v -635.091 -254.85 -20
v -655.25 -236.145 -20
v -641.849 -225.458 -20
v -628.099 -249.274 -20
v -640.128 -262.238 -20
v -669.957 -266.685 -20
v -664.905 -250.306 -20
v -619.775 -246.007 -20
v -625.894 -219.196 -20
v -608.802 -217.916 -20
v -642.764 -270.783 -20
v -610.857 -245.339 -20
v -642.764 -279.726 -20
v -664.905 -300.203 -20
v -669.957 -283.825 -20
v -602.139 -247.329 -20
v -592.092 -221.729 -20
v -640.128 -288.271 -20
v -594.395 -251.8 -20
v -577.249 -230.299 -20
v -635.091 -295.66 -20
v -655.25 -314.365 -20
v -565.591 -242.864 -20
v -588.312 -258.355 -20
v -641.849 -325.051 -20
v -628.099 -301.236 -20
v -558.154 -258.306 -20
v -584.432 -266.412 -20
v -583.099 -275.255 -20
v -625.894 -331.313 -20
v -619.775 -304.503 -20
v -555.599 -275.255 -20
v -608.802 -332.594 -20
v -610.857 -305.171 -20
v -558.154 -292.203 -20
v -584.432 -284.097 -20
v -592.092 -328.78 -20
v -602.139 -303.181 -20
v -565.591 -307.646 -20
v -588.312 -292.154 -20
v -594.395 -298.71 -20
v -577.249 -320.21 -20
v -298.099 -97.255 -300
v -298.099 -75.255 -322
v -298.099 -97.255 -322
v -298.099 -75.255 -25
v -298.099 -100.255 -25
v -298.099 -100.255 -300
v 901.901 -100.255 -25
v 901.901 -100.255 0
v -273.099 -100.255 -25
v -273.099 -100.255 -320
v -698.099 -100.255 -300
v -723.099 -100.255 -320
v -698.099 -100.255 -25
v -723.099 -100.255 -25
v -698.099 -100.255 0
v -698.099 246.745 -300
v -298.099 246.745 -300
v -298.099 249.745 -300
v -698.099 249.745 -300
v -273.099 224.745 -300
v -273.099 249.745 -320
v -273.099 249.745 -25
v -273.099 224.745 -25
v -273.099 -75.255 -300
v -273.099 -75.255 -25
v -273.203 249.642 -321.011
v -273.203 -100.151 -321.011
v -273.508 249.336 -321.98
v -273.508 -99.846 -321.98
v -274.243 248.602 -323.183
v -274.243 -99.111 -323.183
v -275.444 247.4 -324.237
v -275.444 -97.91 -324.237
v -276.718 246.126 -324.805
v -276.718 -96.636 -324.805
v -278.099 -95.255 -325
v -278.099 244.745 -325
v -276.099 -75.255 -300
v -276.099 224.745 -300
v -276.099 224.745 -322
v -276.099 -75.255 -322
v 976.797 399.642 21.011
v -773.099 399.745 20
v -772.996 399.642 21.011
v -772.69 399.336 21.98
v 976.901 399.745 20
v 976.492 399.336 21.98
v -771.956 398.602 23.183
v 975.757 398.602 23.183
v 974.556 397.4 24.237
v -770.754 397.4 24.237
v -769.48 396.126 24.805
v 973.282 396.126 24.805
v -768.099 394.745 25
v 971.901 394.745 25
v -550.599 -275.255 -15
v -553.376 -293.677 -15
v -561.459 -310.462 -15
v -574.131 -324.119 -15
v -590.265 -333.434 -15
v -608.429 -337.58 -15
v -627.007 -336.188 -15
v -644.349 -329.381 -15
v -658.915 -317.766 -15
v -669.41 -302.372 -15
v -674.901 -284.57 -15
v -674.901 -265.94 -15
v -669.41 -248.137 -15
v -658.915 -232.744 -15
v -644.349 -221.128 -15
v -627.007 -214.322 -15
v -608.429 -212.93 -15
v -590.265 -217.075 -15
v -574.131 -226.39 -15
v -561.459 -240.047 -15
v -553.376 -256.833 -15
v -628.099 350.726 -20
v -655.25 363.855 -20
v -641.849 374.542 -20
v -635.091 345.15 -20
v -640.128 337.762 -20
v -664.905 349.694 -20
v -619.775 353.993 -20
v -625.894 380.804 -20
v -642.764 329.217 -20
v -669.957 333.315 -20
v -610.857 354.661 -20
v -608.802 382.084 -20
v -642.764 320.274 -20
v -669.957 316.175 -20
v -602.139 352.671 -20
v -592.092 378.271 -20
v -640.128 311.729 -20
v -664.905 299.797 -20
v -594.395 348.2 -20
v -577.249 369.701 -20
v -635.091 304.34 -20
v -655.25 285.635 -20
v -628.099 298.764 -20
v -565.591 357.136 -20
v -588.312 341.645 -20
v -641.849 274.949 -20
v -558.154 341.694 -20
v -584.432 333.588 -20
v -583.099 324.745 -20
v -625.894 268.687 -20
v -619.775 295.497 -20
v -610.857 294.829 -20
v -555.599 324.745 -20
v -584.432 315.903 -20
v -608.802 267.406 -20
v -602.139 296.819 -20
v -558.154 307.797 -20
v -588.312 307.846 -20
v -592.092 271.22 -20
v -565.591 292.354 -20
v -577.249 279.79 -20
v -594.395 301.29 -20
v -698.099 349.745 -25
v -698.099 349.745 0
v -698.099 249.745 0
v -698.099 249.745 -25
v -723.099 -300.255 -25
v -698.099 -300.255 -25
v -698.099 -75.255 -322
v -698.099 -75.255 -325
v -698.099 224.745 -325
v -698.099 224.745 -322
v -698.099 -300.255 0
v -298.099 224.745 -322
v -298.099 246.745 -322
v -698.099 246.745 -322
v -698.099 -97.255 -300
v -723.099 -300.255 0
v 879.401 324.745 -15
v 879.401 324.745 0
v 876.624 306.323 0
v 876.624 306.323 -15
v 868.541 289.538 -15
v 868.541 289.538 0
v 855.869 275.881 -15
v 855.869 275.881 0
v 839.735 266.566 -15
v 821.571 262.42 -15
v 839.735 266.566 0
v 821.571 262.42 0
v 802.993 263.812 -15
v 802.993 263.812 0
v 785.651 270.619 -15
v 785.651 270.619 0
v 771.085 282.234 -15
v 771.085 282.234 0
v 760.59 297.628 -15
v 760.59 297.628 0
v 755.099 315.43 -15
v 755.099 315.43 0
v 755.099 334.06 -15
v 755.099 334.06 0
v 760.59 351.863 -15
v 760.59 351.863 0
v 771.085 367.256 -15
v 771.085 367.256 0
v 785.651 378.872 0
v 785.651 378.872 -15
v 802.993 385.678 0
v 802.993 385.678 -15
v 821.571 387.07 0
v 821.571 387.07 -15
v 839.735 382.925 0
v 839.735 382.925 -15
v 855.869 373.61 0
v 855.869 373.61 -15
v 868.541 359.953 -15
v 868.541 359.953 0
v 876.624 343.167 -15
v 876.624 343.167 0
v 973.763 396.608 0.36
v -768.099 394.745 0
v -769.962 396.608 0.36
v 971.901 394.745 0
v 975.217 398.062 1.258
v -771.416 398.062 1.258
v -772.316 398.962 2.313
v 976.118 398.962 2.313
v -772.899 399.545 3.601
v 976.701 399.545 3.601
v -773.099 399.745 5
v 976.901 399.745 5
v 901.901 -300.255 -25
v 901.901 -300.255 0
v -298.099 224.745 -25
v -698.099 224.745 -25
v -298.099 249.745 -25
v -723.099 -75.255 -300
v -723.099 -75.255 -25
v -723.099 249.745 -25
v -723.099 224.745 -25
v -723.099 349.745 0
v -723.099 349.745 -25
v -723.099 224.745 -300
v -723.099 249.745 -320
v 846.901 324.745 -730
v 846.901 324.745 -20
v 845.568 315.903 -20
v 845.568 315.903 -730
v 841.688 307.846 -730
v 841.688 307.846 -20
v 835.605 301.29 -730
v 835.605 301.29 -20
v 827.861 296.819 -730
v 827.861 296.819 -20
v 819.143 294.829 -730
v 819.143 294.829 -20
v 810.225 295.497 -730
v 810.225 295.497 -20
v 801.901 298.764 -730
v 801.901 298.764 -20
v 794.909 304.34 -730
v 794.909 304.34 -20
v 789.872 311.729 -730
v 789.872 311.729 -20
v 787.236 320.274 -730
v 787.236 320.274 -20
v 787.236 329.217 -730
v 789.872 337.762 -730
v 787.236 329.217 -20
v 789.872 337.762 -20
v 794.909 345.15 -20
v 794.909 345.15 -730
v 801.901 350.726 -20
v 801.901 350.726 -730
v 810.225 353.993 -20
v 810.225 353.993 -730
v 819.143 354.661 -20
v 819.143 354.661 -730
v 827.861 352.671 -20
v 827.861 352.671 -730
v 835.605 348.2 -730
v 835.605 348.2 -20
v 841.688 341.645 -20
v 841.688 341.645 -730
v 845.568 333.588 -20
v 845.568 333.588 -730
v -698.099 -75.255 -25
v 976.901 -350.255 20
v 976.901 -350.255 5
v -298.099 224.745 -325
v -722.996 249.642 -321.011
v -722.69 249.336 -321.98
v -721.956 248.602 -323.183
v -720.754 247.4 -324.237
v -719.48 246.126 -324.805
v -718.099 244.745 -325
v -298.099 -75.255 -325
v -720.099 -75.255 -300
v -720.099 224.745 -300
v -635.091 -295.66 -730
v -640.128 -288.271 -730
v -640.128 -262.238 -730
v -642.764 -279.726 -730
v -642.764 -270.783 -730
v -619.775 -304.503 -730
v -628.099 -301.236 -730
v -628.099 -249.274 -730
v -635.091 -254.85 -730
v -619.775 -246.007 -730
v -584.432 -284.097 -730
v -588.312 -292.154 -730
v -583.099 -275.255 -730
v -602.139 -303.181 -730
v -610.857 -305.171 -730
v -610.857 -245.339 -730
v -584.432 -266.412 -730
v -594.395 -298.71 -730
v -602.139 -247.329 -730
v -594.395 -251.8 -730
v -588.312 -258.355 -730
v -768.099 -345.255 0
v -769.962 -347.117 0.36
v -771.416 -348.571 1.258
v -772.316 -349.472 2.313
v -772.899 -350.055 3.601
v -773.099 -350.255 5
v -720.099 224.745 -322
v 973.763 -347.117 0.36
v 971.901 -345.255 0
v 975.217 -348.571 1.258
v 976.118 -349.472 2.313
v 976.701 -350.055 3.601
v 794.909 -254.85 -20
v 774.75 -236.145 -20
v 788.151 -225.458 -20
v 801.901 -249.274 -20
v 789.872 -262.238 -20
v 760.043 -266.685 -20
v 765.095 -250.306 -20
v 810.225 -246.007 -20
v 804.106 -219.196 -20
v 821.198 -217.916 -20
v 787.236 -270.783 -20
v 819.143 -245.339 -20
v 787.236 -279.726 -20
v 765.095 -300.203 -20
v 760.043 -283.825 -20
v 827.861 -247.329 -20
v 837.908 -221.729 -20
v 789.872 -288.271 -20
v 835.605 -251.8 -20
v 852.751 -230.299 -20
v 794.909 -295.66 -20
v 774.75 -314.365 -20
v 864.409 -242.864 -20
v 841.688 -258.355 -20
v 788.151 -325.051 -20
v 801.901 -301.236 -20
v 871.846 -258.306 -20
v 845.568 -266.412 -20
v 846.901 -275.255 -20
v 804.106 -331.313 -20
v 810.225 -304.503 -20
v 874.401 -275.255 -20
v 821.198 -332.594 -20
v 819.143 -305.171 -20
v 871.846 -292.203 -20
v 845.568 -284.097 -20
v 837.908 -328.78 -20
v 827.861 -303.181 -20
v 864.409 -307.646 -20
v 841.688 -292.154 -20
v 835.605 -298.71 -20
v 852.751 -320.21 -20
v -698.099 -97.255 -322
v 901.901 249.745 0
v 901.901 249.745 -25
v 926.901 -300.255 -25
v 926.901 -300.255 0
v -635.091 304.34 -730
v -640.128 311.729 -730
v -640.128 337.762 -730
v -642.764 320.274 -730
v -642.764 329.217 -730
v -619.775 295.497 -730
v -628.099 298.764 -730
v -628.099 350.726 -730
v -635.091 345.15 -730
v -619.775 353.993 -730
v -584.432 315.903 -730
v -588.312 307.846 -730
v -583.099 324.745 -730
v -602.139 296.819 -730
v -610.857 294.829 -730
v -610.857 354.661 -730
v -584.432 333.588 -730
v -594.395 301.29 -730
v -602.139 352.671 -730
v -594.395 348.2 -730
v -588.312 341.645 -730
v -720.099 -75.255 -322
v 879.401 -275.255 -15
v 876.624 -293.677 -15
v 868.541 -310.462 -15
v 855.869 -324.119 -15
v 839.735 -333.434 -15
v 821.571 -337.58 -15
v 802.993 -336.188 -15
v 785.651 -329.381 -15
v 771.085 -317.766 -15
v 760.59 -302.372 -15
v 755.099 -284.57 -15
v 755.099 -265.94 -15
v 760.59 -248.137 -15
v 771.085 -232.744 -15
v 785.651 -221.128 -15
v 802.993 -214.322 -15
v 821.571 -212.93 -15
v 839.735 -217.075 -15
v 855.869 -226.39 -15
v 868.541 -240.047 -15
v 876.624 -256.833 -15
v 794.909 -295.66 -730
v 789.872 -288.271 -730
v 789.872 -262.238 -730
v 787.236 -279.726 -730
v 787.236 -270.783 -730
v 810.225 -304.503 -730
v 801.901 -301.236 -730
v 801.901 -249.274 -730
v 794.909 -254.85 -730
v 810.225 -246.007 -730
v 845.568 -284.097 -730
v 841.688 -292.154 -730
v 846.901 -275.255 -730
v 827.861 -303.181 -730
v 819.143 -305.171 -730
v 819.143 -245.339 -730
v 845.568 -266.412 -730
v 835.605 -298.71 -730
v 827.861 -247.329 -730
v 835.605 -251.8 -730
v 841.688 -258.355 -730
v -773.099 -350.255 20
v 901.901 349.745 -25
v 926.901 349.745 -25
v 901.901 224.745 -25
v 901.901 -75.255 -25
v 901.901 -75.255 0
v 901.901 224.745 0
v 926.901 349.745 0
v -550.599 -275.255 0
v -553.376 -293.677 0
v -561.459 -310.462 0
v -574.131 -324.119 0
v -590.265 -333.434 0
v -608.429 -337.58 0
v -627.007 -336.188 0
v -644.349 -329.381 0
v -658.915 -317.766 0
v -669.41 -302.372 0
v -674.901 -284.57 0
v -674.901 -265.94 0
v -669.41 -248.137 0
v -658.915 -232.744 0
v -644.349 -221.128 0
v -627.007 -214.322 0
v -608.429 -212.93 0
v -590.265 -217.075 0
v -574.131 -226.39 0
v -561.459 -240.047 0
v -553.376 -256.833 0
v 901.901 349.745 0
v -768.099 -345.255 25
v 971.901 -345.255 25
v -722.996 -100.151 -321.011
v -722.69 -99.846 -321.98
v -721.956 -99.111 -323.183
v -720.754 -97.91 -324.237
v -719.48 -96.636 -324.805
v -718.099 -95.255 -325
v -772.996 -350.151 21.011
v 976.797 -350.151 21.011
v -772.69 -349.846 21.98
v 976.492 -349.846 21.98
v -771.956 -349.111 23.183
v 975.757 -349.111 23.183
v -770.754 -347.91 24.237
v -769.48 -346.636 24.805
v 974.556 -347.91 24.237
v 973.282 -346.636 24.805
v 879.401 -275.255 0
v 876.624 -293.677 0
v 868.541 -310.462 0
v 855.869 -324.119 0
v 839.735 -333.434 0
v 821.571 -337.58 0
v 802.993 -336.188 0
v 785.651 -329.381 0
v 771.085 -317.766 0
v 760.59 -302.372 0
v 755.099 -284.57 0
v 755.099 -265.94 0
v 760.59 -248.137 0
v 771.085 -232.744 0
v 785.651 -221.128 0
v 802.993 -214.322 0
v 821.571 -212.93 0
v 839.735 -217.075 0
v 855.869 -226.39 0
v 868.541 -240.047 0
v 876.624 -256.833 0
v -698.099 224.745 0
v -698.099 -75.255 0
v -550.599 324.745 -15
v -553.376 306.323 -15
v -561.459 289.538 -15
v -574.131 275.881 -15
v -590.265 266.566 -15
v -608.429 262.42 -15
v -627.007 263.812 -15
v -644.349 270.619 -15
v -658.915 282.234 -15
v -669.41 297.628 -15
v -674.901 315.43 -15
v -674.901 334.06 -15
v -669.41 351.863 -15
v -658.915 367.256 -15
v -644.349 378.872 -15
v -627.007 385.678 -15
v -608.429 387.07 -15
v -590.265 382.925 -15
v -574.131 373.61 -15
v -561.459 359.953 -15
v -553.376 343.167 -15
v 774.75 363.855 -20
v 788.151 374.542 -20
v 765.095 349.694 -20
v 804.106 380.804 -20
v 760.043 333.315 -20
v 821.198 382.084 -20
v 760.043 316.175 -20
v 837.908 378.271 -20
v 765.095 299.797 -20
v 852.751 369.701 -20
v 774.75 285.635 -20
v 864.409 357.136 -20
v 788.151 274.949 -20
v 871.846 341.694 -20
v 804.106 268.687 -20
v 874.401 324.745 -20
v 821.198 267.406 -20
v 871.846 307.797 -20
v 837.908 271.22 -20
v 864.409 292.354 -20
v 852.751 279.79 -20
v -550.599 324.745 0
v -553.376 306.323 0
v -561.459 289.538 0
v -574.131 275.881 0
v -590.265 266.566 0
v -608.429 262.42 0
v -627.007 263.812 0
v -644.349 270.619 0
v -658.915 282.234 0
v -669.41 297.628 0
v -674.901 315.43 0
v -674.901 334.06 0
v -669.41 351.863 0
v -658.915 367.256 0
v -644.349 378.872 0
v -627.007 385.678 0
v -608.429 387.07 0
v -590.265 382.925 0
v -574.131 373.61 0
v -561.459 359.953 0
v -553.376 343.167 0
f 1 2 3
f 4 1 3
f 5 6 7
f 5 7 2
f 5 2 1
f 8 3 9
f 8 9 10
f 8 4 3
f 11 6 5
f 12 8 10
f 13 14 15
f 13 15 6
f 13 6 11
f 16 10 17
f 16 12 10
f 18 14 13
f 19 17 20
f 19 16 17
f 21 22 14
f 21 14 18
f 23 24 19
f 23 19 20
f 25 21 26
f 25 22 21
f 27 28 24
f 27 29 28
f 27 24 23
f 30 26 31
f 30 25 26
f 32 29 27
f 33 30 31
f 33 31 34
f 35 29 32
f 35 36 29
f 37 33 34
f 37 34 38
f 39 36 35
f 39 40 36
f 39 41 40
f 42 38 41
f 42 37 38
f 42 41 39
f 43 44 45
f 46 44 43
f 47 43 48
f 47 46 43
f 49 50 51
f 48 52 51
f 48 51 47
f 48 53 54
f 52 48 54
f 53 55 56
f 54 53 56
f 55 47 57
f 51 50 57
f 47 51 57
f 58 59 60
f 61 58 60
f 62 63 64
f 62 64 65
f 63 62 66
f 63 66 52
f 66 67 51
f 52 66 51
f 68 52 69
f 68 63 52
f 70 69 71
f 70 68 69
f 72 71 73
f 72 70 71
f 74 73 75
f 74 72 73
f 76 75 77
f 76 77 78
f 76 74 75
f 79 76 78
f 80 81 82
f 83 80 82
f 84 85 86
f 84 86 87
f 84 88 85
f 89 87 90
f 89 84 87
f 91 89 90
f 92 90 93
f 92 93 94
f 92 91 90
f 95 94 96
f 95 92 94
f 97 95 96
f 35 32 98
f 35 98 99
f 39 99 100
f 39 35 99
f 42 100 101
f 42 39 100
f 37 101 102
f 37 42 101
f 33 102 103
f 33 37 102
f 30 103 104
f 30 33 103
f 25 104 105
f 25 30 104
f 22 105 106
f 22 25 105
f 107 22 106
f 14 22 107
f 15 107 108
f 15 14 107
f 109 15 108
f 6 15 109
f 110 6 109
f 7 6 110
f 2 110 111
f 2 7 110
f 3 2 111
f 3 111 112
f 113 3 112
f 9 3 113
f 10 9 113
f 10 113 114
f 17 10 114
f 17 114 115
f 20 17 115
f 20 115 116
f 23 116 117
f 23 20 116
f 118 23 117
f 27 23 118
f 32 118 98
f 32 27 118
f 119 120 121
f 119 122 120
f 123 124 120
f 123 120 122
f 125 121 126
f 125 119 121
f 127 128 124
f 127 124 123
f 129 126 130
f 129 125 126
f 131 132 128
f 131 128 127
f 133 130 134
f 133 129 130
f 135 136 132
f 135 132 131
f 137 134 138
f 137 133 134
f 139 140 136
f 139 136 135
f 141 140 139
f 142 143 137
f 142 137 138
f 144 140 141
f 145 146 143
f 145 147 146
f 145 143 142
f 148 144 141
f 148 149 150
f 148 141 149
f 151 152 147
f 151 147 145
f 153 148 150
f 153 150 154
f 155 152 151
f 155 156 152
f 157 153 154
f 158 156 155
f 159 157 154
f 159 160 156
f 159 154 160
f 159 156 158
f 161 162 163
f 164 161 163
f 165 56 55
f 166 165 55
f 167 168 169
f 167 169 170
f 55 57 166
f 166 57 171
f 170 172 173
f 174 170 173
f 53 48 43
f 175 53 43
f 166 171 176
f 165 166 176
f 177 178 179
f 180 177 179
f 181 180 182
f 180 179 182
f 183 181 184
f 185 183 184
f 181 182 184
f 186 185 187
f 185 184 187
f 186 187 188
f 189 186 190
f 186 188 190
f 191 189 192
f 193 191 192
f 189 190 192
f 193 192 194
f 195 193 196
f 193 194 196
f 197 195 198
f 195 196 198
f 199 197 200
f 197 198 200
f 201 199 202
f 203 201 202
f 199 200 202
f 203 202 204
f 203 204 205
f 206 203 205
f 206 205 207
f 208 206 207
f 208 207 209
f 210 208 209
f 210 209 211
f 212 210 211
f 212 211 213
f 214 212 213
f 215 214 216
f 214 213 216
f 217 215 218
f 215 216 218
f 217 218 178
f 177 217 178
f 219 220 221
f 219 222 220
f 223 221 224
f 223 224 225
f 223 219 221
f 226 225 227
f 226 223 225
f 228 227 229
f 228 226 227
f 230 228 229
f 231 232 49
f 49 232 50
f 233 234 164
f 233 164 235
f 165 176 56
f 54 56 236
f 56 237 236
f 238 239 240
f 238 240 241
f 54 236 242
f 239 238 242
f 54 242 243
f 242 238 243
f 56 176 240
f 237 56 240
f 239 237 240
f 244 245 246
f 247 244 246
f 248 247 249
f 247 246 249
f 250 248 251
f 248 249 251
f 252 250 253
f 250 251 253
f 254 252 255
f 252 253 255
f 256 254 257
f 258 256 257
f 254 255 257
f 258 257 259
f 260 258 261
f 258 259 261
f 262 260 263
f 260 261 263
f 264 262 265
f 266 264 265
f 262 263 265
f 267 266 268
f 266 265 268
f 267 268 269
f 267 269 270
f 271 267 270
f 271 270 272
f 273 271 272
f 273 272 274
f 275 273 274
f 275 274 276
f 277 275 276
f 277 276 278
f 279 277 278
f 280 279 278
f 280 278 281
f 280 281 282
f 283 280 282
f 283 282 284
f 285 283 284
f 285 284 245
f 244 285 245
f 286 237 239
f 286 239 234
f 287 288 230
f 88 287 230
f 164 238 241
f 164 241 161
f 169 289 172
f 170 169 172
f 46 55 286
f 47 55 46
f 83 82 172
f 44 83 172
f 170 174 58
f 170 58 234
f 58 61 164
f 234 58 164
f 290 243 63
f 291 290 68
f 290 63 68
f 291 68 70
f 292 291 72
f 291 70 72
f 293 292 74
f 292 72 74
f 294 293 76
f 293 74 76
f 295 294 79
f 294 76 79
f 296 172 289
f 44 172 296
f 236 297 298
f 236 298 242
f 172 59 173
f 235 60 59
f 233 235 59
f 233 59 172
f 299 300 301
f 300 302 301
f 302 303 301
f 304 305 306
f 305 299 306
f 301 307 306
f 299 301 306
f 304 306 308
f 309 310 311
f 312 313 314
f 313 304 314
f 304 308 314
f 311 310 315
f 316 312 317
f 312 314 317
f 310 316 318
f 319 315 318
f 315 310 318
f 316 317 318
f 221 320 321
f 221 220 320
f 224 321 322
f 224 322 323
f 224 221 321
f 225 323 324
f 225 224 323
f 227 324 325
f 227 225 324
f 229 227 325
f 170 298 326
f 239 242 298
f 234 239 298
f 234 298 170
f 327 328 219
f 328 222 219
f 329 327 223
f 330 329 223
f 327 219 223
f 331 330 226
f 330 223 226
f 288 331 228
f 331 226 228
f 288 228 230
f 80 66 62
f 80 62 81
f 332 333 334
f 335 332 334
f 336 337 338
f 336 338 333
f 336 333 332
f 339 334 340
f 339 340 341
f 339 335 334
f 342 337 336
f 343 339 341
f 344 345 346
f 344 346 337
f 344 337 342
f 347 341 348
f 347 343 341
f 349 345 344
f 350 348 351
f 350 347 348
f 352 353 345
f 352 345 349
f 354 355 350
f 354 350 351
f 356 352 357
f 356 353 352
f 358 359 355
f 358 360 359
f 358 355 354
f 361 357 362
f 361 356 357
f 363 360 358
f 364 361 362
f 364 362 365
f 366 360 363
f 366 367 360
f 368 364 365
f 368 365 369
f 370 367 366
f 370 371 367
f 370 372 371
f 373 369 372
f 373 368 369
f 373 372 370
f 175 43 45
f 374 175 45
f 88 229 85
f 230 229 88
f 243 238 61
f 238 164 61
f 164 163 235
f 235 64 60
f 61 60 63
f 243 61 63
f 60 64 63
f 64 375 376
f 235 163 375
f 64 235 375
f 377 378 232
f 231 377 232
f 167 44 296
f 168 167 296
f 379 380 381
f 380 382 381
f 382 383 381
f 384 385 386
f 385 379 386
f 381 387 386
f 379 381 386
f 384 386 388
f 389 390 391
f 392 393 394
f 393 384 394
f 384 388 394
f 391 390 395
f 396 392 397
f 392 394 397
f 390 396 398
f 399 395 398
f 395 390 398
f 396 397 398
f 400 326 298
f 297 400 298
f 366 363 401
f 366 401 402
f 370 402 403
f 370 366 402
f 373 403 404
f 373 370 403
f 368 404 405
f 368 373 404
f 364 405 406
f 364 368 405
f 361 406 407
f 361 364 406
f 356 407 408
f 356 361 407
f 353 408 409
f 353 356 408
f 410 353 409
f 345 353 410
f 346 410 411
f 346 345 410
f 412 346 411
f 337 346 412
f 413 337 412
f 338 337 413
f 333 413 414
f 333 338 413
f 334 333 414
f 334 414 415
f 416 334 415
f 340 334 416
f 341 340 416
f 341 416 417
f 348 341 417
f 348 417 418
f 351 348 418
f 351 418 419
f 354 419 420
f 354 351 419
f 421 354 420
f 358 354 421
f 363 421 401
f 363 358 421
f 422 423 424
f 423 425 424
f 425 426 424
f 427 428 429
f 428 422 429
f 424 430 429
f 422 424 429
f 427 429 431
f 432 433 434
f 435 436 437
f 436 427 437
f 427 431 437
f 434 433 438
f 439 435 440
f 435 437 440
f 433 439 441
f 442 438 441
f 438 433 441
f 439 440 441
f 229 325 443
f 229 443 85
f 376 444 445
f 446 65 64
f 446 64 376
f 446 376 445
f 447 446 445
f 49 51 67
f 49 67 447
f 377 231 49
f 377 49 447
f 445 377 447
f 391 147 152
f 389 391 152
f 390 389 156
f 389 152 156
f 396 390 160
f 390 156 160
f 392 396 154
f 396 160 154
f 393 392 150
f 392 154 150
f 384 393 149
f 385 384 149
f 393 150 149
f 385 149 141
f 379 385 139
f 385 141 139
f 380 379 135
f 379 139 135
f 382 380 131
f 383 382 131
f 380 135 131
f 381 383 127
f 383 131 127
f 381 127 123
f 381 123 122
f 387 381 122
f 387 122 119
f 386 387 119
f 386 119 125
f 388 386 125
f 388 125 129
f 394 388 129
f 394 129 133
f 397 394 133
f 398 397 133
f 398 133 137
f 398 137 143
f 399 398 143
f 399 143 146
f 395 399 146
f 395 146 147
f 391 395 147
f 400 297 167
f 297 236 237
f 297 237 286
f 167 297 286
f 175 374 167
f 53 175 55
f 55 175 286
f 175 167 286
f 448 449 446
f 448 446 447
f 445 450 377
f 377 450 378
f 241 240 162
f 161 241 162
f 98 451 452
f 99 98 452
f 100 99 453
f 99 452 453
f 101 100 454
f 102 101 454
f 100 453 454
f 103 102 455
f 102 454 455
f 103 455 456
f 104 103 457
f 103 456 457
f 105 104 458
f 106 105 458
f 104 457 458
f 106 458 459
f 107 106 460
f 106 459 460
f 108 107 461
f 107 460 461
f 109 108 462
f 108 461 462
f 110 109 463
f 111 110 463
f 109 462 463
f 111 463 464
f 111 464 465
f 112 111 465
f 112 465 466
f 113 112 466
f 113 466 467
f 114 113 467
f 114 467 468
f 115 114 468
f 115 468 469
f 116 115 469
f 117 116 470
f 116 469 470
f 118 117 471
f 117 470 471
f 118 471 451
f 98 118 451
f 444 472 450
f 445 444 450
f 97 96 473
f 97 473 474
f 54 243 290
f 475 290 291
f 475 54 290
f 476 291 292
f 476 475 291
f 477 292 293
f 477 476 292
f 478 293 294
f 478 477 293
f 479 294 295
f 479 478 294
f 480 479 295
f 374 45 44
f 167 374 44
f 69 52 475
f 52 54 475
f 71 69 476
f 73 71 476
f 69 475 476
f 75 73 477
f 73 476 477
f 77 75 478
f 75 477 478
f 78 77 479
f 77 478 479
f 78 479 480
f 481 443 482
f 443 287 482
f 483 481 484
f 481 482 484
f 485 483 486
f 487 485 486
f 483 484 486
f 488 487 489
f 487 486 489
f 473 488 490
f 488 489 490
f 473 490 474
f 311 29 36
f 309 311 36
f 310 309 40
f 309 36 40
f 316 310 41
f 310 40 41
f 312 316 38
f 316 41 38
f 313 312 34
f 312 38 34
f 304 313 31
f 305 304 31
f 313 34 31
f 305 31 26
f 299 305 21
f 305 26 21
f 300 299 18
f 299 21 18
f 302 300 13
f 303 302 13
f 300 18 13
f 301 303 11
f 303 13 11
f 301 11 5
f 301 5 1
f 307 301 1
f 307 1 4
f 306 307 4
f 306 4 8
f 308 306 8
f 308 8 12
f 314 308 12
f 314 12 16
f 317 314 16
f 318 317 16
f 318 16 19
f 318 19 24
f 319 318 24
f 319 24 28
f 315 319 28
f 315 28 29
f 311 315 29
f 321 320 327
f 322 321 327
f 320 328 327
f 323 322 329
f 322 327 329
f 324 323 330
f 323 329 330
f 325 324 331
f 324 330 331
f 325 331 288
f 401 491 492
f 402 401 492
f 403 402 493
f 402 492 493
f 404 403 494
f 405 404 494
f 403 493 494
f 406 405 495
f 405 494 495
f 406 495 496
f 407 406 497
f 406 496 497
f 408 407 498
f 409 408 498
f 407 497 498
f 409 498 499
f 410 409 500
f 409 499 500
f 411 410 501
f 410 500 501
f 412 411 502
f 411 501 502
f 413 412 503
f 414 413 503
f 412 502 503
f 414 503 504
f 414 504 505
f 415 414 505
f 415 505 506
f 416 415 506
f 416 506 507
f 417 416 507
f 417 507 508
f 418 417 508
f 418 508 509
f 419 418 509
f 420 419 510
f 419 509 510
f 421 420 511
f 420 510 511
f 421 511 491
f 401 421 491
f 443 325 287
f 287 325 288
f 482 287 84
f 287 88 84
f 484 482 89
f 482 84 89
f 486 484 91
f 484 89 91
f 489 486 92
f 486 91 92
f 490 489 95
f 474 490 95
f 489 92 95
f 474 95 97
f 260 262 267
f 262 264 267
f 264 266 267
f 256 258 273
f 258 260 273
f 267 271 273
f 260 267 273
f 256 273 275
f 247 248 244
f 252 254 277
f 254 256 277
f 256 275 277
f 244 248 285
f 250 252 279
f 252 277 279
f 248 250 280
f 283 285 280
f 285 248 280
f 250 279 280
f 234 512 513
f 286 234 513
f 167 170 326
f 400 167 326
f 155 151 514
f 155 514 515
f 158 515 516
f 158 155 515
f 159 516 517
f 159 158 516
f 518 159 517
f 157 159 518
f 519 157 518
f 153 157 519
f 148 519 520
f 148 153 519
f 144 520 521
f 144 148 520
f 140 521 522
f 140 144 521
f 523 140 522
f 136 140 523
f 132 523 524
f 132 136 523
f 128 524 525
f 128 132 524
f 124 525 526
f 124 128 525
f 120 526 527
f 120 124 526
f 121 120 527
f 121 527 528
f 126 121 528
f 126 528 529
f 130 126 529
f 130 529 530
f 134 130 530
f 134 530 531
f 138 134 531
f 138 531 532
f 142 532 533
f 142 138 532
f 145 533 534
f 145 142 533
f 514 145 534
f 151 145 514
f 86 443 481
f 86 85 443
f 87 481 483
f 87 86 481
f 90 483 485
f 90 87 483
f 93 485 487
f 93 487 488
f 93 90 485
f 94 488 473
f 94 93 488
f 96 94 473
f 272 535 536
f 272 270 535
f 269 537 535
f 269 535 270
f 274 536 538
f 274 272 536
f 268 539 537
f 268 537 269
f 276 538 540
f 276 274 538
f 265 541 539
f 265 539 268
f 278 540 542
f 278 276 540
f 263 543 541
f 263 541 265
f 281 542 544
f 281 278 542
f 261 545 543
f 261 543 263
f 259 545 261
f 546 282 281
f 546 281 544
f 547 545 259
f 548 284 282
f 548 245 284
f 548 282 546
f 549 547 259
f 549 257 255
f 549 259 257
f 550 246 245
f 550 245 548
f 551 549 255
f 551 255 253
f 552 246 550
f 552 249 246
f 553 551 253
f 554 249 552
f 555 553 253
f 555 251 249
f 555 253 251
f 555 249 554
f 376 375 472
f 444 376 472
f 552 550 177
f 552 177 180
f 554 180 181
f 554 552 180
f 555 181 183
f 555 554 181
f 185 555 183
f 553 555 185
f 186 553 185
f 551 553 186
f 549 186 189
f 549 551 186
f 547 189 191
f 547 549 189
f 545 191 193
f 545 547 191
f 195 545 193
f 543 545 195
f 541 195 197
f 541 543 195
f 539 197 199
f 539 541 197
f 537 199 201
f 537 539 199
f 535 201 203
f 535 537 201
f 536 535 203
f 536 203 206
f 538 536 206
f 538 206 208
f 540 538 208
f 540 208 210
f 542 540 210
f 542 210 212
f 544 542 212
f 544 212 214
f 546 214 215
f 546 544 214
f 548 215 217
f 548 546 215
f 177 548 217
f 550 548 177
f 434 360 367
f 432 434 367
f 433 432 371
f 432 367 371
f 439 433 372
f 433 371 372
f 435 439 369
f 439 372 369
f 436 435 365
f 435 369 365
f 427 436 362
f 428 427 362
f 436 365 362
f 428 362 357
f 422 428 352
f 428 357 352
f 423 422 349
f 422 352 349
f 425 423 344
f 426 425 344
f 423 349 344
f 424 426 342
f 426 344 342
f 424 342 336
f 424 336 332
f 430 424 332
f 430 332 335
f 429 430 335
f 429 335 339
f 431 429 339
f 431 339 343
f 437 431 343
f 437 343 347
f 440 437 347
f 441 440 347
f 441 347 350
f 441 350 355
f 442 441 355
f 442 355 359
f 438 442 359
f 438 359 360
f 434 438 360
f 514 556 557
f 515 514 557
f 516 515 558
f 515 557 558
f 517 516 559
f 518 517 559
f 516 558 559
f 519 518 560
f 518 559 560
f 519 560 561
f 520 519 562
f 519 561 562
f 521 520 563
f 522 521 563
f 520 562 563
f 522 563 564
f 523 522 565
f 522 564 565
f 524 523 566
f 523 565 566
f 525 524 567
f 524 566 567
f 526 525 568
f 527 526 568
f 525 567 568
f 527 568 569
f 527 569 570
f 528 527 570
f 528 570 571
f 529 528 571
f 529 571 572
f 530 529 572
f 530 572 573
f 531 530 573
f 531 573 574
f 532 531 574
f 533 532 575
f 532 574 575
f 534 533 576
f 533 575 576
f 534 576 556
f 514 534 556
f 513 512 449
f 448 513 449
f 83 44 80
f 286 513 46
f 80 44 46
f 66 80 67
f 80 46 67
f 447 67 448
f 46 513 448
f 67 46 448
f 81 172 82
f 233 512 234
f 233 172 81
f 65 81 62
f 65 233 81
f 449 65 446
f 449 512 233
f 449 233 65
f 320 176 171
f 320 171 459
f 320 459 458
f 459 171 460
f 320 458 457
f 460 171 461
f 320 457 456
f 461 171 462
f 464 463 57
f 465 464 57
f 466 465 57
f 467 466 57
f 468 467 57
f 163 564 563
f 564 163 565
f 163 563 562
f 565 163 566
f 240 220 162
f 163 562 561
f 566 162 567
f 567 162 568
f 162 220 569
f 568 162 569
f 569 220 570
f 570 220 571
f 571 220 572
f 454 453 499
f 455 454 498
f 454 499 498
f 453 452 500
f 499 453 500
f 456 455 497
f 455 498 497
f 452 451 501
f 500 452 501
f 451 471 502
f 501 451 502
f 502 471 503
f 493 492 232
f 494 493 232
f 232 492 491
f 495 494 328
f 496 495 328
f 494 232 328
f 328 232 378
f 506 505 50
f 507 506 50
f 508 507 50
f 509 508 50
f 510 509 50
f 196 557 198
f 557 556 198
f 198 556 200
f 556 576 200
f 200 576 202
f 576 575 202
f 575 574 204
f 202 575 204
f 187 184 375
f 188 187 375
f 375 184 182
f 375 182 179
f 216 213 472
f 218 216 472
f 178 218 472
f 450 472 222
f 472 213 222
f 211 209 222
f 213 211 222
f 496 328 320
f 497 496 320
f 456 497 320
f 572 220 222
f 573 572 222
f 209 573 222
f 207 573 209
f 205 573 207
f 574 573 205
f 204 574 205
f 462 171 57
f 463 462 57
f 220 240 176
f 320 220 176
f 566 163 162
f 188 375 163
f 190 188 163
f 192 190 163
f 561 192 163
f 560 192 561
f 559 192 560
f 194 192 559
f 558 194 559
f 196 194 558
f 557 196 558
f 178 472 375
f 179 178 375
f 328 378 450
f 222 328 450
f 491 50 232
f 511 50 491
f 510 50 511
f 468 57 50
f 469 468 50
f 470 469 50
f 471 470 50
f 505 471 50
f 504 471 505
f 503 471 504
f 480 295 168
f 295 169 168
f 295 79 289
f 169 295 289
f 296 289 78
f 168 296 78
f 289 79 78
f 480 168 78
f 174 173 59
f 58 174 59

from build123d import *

# Parameters (mm, degrees)
F0_W      = 1750
F0_H      = 750
F1_DEPTH  = 25
F2_W      = 1600
F2_H      = 300
F3_DEPTH  = 25
F4_R      = 62.5
F4_R_2    = 30
F5_DEPTH  = 20
F6_DEPTH  = 730
F7_W      = 25
F7_H      = 25
F8_DEPTH  = 300
F10_DEPTH = 300
F12_DEPTH = 400
F13_R     = 5
F14_R     = 5
F15_SIZE  = 5


with BuildPart() as f1:
    # F0 (on Top) → F1 (new body)
    with BuildSketch(Plane.XY):
        with Locations((101.9007265568, 24.7452616992)):
            Rectangle(F0_W, F0_H)
    extrude(amount=F1_DEPTH)

    # F2 (on face) → F3 (join)
    with BuildSketch(Plane(origin=(0, 0, 0), x_dir=(1, 0, 0), z_dir=(0, 0, -1))):
        Polygon((-698.0992734432, 300.2547383008), (-723.0992734432, 300.2547383008), (-723.0992734432, -324.7452616992), (-723.0992734432, -349.7452616992), (-698.0992734432, -349.7452616992), (-698.0992734432, -249.7452616992), (901.9007265568, -249.7452616992), (901.9007265568, -349.7452616992), (926.9007265568, -349.7452616992), (926.9007265568, -324.7452616992), (926.9007265568, 300.2547383008), (901.9007265568, 300.2547383008), (901.9007265568, 100.2547383008), (-698.0992734432, 100.2547383008), align=None)
        with Locations((101.9007265568, -74.7452616992)):
            Rectangle(F2_W, F2_H, mode=Mode.SUBTRACT)
    extrude(amount=F3_DEPTH)

    # F4 (on face) → F5 (join)
    with BuildSketch(Plane(origin=(0, 0, 0), x_dir=(1, 0, 0), z_dir=(0, 0, -1))):
        with Locations((816.9007265568, 275.2547383008)):
            Circle(F4_R)
        with Locations((816.9007265568, 275.2547383008)):
            Circle(F4_R_2, mode=Mode.SUBTRACT)
        with Locations((-613.0992734432, 275.2547383008)):
            Circle(F4_R)
        with Locations((-613.0992734432, 275.2547383008)):
            Circle(F4_R_2, mode=Mode.SUBTRACT)
        with Locations((-613.0992734432, -324.7452616992)):
            Circle(F4_R)
        with Locations((-613.0992734432, -324.7452616992)):
            Circle(F4_R_2, mode=Mode.SUBTRACT)
        with Locations((816.9007265568, -324.7452616992)):
            Circle(F4_R)
        with Locations((816.9007265568, -324.7452616992)):
            Circle(F4_R_2, mode=Mode.SUBTRACT)
    extrude(amount=F5_DEPTH)

    # F6 (add): faces of the model
    f6_faces = [f1.faces().sort_by_distance(p)[0] for p in [
        (816.9007265568, 324.7452616992, 0),
        (-613.0992734432, 324.7452616992, 0),
        (-613.0992734432, -275.2547383008, 0),
        (816.9007265568, -275.2547383008, 0),
    ]]
    extrude(f6_faces, amount=F6_DEPTH)

    # F7 (on face) → F8 (join)
    with BuildSketch(Plane(origin=(0, 0, -25), x_dir=(1, 0, 0), z_dir=(0, 0, -1))):
        with Locations((-710.5992734432, 87.7547383008)):
            Rectangle(F7_W, F7_H)
        with Locations((-285.5992734432, 87.7547383008)):
            Rectangle(F7_W, F7_H)
        with Locations((-285.5992734432, -237.2452616992)):
            Rectangle(F7_W, F7_H)
        with Locations((-710.5992734432, -237.2452616992)):
            Rectangle(F7_W, F7_H)
    extrude(amount=F8_DEPTH)

    # F9 (on face) → F10 (join, through all)
    with BuildSketch(Plane.XZ.offset(-224.7452616992)):
        Polygon((-723.0992734432, -300), (-723.0992734432, -325), (-720.0992734432, -325), (-719.87169981, -325), (-698.0992734432, -325), (-698.0992734432, -322), (-720.0992734432, -322), (-720.0992734432, -300), align=None)
        Polygon((-298.0992734432, -322), (-298.0992734432, -325), (-273.0992734432, -325), (-273.0992734432, -300), (-276.0992734432, -300), (-276.0992734432, -322), align=None)
    extrude(amount=F10_DEPTH)

    # F11 (on face) → F12 (join, through all)
    with BuildSketch(Plane(origin=(-298.0992734432, 0, 0), x_dir=(0, -1, 0), z_dir=(-1, 0, 0))):
        Polygon((-224.7452616992, -325), (-224.7452616992, -322), (-246.7452616992, -322), (-246.7452616992, -300), (-249.7452616992, -300), (-249.7452616992, -322), (-249.7452616992, -325), align=None)
        Polygon((97.2547383008, -322), (75.2547383008, -322), (75.2547383008, -325), (100.2547383008, -325), (100.2547383008, -322), (100.2547383008, -300), (97.2547383008, -300), align=None)
    extrude(amount=F12_DEPTH)

    # F13
    f13_edges = [f1.edges().sort_by_distance(p)[0] for p in [
        (-723.099273, 74.745262, -325),
        (-498.099273, -100.254738, -325),
        (-273.099273, 74.745262, -325),
        (-498.099273, 249.745262, -325),
    ]]
    fillet(f13_edges, radius=F13_R)

    # F14
    f14_edges = [f1.edges().sort_by_distance(p)[0] for p in [
        (101.900727, 399.745262, 25),
        (-773.099273, 24.745262, 25),
        (101.900727, -350.254738, 25),
        (976.900727, 24.745262, 25),
        (101.900727, -350.254738, 0),
        (-773.099273, 24.745262, 0),
        (976.900727, 24.745262, 0),
        (101.900727, 399.745262, 0),
    ]]
    fillet(f14_edges, radius=F14_R)

    # F15
    f15_edges = [f1.edges().sort_by_distance(p)[0] for p in [
        (-675.599273, -275.254738, -20),
        (754.400727, -275.254738, -20),
        (754.400727, 324.745262, -20),
        (-675.599273, 324.745262, -20),
    ]]
    chamfer(f15_edges, length=F15_SIZE)


solid = f1.part
